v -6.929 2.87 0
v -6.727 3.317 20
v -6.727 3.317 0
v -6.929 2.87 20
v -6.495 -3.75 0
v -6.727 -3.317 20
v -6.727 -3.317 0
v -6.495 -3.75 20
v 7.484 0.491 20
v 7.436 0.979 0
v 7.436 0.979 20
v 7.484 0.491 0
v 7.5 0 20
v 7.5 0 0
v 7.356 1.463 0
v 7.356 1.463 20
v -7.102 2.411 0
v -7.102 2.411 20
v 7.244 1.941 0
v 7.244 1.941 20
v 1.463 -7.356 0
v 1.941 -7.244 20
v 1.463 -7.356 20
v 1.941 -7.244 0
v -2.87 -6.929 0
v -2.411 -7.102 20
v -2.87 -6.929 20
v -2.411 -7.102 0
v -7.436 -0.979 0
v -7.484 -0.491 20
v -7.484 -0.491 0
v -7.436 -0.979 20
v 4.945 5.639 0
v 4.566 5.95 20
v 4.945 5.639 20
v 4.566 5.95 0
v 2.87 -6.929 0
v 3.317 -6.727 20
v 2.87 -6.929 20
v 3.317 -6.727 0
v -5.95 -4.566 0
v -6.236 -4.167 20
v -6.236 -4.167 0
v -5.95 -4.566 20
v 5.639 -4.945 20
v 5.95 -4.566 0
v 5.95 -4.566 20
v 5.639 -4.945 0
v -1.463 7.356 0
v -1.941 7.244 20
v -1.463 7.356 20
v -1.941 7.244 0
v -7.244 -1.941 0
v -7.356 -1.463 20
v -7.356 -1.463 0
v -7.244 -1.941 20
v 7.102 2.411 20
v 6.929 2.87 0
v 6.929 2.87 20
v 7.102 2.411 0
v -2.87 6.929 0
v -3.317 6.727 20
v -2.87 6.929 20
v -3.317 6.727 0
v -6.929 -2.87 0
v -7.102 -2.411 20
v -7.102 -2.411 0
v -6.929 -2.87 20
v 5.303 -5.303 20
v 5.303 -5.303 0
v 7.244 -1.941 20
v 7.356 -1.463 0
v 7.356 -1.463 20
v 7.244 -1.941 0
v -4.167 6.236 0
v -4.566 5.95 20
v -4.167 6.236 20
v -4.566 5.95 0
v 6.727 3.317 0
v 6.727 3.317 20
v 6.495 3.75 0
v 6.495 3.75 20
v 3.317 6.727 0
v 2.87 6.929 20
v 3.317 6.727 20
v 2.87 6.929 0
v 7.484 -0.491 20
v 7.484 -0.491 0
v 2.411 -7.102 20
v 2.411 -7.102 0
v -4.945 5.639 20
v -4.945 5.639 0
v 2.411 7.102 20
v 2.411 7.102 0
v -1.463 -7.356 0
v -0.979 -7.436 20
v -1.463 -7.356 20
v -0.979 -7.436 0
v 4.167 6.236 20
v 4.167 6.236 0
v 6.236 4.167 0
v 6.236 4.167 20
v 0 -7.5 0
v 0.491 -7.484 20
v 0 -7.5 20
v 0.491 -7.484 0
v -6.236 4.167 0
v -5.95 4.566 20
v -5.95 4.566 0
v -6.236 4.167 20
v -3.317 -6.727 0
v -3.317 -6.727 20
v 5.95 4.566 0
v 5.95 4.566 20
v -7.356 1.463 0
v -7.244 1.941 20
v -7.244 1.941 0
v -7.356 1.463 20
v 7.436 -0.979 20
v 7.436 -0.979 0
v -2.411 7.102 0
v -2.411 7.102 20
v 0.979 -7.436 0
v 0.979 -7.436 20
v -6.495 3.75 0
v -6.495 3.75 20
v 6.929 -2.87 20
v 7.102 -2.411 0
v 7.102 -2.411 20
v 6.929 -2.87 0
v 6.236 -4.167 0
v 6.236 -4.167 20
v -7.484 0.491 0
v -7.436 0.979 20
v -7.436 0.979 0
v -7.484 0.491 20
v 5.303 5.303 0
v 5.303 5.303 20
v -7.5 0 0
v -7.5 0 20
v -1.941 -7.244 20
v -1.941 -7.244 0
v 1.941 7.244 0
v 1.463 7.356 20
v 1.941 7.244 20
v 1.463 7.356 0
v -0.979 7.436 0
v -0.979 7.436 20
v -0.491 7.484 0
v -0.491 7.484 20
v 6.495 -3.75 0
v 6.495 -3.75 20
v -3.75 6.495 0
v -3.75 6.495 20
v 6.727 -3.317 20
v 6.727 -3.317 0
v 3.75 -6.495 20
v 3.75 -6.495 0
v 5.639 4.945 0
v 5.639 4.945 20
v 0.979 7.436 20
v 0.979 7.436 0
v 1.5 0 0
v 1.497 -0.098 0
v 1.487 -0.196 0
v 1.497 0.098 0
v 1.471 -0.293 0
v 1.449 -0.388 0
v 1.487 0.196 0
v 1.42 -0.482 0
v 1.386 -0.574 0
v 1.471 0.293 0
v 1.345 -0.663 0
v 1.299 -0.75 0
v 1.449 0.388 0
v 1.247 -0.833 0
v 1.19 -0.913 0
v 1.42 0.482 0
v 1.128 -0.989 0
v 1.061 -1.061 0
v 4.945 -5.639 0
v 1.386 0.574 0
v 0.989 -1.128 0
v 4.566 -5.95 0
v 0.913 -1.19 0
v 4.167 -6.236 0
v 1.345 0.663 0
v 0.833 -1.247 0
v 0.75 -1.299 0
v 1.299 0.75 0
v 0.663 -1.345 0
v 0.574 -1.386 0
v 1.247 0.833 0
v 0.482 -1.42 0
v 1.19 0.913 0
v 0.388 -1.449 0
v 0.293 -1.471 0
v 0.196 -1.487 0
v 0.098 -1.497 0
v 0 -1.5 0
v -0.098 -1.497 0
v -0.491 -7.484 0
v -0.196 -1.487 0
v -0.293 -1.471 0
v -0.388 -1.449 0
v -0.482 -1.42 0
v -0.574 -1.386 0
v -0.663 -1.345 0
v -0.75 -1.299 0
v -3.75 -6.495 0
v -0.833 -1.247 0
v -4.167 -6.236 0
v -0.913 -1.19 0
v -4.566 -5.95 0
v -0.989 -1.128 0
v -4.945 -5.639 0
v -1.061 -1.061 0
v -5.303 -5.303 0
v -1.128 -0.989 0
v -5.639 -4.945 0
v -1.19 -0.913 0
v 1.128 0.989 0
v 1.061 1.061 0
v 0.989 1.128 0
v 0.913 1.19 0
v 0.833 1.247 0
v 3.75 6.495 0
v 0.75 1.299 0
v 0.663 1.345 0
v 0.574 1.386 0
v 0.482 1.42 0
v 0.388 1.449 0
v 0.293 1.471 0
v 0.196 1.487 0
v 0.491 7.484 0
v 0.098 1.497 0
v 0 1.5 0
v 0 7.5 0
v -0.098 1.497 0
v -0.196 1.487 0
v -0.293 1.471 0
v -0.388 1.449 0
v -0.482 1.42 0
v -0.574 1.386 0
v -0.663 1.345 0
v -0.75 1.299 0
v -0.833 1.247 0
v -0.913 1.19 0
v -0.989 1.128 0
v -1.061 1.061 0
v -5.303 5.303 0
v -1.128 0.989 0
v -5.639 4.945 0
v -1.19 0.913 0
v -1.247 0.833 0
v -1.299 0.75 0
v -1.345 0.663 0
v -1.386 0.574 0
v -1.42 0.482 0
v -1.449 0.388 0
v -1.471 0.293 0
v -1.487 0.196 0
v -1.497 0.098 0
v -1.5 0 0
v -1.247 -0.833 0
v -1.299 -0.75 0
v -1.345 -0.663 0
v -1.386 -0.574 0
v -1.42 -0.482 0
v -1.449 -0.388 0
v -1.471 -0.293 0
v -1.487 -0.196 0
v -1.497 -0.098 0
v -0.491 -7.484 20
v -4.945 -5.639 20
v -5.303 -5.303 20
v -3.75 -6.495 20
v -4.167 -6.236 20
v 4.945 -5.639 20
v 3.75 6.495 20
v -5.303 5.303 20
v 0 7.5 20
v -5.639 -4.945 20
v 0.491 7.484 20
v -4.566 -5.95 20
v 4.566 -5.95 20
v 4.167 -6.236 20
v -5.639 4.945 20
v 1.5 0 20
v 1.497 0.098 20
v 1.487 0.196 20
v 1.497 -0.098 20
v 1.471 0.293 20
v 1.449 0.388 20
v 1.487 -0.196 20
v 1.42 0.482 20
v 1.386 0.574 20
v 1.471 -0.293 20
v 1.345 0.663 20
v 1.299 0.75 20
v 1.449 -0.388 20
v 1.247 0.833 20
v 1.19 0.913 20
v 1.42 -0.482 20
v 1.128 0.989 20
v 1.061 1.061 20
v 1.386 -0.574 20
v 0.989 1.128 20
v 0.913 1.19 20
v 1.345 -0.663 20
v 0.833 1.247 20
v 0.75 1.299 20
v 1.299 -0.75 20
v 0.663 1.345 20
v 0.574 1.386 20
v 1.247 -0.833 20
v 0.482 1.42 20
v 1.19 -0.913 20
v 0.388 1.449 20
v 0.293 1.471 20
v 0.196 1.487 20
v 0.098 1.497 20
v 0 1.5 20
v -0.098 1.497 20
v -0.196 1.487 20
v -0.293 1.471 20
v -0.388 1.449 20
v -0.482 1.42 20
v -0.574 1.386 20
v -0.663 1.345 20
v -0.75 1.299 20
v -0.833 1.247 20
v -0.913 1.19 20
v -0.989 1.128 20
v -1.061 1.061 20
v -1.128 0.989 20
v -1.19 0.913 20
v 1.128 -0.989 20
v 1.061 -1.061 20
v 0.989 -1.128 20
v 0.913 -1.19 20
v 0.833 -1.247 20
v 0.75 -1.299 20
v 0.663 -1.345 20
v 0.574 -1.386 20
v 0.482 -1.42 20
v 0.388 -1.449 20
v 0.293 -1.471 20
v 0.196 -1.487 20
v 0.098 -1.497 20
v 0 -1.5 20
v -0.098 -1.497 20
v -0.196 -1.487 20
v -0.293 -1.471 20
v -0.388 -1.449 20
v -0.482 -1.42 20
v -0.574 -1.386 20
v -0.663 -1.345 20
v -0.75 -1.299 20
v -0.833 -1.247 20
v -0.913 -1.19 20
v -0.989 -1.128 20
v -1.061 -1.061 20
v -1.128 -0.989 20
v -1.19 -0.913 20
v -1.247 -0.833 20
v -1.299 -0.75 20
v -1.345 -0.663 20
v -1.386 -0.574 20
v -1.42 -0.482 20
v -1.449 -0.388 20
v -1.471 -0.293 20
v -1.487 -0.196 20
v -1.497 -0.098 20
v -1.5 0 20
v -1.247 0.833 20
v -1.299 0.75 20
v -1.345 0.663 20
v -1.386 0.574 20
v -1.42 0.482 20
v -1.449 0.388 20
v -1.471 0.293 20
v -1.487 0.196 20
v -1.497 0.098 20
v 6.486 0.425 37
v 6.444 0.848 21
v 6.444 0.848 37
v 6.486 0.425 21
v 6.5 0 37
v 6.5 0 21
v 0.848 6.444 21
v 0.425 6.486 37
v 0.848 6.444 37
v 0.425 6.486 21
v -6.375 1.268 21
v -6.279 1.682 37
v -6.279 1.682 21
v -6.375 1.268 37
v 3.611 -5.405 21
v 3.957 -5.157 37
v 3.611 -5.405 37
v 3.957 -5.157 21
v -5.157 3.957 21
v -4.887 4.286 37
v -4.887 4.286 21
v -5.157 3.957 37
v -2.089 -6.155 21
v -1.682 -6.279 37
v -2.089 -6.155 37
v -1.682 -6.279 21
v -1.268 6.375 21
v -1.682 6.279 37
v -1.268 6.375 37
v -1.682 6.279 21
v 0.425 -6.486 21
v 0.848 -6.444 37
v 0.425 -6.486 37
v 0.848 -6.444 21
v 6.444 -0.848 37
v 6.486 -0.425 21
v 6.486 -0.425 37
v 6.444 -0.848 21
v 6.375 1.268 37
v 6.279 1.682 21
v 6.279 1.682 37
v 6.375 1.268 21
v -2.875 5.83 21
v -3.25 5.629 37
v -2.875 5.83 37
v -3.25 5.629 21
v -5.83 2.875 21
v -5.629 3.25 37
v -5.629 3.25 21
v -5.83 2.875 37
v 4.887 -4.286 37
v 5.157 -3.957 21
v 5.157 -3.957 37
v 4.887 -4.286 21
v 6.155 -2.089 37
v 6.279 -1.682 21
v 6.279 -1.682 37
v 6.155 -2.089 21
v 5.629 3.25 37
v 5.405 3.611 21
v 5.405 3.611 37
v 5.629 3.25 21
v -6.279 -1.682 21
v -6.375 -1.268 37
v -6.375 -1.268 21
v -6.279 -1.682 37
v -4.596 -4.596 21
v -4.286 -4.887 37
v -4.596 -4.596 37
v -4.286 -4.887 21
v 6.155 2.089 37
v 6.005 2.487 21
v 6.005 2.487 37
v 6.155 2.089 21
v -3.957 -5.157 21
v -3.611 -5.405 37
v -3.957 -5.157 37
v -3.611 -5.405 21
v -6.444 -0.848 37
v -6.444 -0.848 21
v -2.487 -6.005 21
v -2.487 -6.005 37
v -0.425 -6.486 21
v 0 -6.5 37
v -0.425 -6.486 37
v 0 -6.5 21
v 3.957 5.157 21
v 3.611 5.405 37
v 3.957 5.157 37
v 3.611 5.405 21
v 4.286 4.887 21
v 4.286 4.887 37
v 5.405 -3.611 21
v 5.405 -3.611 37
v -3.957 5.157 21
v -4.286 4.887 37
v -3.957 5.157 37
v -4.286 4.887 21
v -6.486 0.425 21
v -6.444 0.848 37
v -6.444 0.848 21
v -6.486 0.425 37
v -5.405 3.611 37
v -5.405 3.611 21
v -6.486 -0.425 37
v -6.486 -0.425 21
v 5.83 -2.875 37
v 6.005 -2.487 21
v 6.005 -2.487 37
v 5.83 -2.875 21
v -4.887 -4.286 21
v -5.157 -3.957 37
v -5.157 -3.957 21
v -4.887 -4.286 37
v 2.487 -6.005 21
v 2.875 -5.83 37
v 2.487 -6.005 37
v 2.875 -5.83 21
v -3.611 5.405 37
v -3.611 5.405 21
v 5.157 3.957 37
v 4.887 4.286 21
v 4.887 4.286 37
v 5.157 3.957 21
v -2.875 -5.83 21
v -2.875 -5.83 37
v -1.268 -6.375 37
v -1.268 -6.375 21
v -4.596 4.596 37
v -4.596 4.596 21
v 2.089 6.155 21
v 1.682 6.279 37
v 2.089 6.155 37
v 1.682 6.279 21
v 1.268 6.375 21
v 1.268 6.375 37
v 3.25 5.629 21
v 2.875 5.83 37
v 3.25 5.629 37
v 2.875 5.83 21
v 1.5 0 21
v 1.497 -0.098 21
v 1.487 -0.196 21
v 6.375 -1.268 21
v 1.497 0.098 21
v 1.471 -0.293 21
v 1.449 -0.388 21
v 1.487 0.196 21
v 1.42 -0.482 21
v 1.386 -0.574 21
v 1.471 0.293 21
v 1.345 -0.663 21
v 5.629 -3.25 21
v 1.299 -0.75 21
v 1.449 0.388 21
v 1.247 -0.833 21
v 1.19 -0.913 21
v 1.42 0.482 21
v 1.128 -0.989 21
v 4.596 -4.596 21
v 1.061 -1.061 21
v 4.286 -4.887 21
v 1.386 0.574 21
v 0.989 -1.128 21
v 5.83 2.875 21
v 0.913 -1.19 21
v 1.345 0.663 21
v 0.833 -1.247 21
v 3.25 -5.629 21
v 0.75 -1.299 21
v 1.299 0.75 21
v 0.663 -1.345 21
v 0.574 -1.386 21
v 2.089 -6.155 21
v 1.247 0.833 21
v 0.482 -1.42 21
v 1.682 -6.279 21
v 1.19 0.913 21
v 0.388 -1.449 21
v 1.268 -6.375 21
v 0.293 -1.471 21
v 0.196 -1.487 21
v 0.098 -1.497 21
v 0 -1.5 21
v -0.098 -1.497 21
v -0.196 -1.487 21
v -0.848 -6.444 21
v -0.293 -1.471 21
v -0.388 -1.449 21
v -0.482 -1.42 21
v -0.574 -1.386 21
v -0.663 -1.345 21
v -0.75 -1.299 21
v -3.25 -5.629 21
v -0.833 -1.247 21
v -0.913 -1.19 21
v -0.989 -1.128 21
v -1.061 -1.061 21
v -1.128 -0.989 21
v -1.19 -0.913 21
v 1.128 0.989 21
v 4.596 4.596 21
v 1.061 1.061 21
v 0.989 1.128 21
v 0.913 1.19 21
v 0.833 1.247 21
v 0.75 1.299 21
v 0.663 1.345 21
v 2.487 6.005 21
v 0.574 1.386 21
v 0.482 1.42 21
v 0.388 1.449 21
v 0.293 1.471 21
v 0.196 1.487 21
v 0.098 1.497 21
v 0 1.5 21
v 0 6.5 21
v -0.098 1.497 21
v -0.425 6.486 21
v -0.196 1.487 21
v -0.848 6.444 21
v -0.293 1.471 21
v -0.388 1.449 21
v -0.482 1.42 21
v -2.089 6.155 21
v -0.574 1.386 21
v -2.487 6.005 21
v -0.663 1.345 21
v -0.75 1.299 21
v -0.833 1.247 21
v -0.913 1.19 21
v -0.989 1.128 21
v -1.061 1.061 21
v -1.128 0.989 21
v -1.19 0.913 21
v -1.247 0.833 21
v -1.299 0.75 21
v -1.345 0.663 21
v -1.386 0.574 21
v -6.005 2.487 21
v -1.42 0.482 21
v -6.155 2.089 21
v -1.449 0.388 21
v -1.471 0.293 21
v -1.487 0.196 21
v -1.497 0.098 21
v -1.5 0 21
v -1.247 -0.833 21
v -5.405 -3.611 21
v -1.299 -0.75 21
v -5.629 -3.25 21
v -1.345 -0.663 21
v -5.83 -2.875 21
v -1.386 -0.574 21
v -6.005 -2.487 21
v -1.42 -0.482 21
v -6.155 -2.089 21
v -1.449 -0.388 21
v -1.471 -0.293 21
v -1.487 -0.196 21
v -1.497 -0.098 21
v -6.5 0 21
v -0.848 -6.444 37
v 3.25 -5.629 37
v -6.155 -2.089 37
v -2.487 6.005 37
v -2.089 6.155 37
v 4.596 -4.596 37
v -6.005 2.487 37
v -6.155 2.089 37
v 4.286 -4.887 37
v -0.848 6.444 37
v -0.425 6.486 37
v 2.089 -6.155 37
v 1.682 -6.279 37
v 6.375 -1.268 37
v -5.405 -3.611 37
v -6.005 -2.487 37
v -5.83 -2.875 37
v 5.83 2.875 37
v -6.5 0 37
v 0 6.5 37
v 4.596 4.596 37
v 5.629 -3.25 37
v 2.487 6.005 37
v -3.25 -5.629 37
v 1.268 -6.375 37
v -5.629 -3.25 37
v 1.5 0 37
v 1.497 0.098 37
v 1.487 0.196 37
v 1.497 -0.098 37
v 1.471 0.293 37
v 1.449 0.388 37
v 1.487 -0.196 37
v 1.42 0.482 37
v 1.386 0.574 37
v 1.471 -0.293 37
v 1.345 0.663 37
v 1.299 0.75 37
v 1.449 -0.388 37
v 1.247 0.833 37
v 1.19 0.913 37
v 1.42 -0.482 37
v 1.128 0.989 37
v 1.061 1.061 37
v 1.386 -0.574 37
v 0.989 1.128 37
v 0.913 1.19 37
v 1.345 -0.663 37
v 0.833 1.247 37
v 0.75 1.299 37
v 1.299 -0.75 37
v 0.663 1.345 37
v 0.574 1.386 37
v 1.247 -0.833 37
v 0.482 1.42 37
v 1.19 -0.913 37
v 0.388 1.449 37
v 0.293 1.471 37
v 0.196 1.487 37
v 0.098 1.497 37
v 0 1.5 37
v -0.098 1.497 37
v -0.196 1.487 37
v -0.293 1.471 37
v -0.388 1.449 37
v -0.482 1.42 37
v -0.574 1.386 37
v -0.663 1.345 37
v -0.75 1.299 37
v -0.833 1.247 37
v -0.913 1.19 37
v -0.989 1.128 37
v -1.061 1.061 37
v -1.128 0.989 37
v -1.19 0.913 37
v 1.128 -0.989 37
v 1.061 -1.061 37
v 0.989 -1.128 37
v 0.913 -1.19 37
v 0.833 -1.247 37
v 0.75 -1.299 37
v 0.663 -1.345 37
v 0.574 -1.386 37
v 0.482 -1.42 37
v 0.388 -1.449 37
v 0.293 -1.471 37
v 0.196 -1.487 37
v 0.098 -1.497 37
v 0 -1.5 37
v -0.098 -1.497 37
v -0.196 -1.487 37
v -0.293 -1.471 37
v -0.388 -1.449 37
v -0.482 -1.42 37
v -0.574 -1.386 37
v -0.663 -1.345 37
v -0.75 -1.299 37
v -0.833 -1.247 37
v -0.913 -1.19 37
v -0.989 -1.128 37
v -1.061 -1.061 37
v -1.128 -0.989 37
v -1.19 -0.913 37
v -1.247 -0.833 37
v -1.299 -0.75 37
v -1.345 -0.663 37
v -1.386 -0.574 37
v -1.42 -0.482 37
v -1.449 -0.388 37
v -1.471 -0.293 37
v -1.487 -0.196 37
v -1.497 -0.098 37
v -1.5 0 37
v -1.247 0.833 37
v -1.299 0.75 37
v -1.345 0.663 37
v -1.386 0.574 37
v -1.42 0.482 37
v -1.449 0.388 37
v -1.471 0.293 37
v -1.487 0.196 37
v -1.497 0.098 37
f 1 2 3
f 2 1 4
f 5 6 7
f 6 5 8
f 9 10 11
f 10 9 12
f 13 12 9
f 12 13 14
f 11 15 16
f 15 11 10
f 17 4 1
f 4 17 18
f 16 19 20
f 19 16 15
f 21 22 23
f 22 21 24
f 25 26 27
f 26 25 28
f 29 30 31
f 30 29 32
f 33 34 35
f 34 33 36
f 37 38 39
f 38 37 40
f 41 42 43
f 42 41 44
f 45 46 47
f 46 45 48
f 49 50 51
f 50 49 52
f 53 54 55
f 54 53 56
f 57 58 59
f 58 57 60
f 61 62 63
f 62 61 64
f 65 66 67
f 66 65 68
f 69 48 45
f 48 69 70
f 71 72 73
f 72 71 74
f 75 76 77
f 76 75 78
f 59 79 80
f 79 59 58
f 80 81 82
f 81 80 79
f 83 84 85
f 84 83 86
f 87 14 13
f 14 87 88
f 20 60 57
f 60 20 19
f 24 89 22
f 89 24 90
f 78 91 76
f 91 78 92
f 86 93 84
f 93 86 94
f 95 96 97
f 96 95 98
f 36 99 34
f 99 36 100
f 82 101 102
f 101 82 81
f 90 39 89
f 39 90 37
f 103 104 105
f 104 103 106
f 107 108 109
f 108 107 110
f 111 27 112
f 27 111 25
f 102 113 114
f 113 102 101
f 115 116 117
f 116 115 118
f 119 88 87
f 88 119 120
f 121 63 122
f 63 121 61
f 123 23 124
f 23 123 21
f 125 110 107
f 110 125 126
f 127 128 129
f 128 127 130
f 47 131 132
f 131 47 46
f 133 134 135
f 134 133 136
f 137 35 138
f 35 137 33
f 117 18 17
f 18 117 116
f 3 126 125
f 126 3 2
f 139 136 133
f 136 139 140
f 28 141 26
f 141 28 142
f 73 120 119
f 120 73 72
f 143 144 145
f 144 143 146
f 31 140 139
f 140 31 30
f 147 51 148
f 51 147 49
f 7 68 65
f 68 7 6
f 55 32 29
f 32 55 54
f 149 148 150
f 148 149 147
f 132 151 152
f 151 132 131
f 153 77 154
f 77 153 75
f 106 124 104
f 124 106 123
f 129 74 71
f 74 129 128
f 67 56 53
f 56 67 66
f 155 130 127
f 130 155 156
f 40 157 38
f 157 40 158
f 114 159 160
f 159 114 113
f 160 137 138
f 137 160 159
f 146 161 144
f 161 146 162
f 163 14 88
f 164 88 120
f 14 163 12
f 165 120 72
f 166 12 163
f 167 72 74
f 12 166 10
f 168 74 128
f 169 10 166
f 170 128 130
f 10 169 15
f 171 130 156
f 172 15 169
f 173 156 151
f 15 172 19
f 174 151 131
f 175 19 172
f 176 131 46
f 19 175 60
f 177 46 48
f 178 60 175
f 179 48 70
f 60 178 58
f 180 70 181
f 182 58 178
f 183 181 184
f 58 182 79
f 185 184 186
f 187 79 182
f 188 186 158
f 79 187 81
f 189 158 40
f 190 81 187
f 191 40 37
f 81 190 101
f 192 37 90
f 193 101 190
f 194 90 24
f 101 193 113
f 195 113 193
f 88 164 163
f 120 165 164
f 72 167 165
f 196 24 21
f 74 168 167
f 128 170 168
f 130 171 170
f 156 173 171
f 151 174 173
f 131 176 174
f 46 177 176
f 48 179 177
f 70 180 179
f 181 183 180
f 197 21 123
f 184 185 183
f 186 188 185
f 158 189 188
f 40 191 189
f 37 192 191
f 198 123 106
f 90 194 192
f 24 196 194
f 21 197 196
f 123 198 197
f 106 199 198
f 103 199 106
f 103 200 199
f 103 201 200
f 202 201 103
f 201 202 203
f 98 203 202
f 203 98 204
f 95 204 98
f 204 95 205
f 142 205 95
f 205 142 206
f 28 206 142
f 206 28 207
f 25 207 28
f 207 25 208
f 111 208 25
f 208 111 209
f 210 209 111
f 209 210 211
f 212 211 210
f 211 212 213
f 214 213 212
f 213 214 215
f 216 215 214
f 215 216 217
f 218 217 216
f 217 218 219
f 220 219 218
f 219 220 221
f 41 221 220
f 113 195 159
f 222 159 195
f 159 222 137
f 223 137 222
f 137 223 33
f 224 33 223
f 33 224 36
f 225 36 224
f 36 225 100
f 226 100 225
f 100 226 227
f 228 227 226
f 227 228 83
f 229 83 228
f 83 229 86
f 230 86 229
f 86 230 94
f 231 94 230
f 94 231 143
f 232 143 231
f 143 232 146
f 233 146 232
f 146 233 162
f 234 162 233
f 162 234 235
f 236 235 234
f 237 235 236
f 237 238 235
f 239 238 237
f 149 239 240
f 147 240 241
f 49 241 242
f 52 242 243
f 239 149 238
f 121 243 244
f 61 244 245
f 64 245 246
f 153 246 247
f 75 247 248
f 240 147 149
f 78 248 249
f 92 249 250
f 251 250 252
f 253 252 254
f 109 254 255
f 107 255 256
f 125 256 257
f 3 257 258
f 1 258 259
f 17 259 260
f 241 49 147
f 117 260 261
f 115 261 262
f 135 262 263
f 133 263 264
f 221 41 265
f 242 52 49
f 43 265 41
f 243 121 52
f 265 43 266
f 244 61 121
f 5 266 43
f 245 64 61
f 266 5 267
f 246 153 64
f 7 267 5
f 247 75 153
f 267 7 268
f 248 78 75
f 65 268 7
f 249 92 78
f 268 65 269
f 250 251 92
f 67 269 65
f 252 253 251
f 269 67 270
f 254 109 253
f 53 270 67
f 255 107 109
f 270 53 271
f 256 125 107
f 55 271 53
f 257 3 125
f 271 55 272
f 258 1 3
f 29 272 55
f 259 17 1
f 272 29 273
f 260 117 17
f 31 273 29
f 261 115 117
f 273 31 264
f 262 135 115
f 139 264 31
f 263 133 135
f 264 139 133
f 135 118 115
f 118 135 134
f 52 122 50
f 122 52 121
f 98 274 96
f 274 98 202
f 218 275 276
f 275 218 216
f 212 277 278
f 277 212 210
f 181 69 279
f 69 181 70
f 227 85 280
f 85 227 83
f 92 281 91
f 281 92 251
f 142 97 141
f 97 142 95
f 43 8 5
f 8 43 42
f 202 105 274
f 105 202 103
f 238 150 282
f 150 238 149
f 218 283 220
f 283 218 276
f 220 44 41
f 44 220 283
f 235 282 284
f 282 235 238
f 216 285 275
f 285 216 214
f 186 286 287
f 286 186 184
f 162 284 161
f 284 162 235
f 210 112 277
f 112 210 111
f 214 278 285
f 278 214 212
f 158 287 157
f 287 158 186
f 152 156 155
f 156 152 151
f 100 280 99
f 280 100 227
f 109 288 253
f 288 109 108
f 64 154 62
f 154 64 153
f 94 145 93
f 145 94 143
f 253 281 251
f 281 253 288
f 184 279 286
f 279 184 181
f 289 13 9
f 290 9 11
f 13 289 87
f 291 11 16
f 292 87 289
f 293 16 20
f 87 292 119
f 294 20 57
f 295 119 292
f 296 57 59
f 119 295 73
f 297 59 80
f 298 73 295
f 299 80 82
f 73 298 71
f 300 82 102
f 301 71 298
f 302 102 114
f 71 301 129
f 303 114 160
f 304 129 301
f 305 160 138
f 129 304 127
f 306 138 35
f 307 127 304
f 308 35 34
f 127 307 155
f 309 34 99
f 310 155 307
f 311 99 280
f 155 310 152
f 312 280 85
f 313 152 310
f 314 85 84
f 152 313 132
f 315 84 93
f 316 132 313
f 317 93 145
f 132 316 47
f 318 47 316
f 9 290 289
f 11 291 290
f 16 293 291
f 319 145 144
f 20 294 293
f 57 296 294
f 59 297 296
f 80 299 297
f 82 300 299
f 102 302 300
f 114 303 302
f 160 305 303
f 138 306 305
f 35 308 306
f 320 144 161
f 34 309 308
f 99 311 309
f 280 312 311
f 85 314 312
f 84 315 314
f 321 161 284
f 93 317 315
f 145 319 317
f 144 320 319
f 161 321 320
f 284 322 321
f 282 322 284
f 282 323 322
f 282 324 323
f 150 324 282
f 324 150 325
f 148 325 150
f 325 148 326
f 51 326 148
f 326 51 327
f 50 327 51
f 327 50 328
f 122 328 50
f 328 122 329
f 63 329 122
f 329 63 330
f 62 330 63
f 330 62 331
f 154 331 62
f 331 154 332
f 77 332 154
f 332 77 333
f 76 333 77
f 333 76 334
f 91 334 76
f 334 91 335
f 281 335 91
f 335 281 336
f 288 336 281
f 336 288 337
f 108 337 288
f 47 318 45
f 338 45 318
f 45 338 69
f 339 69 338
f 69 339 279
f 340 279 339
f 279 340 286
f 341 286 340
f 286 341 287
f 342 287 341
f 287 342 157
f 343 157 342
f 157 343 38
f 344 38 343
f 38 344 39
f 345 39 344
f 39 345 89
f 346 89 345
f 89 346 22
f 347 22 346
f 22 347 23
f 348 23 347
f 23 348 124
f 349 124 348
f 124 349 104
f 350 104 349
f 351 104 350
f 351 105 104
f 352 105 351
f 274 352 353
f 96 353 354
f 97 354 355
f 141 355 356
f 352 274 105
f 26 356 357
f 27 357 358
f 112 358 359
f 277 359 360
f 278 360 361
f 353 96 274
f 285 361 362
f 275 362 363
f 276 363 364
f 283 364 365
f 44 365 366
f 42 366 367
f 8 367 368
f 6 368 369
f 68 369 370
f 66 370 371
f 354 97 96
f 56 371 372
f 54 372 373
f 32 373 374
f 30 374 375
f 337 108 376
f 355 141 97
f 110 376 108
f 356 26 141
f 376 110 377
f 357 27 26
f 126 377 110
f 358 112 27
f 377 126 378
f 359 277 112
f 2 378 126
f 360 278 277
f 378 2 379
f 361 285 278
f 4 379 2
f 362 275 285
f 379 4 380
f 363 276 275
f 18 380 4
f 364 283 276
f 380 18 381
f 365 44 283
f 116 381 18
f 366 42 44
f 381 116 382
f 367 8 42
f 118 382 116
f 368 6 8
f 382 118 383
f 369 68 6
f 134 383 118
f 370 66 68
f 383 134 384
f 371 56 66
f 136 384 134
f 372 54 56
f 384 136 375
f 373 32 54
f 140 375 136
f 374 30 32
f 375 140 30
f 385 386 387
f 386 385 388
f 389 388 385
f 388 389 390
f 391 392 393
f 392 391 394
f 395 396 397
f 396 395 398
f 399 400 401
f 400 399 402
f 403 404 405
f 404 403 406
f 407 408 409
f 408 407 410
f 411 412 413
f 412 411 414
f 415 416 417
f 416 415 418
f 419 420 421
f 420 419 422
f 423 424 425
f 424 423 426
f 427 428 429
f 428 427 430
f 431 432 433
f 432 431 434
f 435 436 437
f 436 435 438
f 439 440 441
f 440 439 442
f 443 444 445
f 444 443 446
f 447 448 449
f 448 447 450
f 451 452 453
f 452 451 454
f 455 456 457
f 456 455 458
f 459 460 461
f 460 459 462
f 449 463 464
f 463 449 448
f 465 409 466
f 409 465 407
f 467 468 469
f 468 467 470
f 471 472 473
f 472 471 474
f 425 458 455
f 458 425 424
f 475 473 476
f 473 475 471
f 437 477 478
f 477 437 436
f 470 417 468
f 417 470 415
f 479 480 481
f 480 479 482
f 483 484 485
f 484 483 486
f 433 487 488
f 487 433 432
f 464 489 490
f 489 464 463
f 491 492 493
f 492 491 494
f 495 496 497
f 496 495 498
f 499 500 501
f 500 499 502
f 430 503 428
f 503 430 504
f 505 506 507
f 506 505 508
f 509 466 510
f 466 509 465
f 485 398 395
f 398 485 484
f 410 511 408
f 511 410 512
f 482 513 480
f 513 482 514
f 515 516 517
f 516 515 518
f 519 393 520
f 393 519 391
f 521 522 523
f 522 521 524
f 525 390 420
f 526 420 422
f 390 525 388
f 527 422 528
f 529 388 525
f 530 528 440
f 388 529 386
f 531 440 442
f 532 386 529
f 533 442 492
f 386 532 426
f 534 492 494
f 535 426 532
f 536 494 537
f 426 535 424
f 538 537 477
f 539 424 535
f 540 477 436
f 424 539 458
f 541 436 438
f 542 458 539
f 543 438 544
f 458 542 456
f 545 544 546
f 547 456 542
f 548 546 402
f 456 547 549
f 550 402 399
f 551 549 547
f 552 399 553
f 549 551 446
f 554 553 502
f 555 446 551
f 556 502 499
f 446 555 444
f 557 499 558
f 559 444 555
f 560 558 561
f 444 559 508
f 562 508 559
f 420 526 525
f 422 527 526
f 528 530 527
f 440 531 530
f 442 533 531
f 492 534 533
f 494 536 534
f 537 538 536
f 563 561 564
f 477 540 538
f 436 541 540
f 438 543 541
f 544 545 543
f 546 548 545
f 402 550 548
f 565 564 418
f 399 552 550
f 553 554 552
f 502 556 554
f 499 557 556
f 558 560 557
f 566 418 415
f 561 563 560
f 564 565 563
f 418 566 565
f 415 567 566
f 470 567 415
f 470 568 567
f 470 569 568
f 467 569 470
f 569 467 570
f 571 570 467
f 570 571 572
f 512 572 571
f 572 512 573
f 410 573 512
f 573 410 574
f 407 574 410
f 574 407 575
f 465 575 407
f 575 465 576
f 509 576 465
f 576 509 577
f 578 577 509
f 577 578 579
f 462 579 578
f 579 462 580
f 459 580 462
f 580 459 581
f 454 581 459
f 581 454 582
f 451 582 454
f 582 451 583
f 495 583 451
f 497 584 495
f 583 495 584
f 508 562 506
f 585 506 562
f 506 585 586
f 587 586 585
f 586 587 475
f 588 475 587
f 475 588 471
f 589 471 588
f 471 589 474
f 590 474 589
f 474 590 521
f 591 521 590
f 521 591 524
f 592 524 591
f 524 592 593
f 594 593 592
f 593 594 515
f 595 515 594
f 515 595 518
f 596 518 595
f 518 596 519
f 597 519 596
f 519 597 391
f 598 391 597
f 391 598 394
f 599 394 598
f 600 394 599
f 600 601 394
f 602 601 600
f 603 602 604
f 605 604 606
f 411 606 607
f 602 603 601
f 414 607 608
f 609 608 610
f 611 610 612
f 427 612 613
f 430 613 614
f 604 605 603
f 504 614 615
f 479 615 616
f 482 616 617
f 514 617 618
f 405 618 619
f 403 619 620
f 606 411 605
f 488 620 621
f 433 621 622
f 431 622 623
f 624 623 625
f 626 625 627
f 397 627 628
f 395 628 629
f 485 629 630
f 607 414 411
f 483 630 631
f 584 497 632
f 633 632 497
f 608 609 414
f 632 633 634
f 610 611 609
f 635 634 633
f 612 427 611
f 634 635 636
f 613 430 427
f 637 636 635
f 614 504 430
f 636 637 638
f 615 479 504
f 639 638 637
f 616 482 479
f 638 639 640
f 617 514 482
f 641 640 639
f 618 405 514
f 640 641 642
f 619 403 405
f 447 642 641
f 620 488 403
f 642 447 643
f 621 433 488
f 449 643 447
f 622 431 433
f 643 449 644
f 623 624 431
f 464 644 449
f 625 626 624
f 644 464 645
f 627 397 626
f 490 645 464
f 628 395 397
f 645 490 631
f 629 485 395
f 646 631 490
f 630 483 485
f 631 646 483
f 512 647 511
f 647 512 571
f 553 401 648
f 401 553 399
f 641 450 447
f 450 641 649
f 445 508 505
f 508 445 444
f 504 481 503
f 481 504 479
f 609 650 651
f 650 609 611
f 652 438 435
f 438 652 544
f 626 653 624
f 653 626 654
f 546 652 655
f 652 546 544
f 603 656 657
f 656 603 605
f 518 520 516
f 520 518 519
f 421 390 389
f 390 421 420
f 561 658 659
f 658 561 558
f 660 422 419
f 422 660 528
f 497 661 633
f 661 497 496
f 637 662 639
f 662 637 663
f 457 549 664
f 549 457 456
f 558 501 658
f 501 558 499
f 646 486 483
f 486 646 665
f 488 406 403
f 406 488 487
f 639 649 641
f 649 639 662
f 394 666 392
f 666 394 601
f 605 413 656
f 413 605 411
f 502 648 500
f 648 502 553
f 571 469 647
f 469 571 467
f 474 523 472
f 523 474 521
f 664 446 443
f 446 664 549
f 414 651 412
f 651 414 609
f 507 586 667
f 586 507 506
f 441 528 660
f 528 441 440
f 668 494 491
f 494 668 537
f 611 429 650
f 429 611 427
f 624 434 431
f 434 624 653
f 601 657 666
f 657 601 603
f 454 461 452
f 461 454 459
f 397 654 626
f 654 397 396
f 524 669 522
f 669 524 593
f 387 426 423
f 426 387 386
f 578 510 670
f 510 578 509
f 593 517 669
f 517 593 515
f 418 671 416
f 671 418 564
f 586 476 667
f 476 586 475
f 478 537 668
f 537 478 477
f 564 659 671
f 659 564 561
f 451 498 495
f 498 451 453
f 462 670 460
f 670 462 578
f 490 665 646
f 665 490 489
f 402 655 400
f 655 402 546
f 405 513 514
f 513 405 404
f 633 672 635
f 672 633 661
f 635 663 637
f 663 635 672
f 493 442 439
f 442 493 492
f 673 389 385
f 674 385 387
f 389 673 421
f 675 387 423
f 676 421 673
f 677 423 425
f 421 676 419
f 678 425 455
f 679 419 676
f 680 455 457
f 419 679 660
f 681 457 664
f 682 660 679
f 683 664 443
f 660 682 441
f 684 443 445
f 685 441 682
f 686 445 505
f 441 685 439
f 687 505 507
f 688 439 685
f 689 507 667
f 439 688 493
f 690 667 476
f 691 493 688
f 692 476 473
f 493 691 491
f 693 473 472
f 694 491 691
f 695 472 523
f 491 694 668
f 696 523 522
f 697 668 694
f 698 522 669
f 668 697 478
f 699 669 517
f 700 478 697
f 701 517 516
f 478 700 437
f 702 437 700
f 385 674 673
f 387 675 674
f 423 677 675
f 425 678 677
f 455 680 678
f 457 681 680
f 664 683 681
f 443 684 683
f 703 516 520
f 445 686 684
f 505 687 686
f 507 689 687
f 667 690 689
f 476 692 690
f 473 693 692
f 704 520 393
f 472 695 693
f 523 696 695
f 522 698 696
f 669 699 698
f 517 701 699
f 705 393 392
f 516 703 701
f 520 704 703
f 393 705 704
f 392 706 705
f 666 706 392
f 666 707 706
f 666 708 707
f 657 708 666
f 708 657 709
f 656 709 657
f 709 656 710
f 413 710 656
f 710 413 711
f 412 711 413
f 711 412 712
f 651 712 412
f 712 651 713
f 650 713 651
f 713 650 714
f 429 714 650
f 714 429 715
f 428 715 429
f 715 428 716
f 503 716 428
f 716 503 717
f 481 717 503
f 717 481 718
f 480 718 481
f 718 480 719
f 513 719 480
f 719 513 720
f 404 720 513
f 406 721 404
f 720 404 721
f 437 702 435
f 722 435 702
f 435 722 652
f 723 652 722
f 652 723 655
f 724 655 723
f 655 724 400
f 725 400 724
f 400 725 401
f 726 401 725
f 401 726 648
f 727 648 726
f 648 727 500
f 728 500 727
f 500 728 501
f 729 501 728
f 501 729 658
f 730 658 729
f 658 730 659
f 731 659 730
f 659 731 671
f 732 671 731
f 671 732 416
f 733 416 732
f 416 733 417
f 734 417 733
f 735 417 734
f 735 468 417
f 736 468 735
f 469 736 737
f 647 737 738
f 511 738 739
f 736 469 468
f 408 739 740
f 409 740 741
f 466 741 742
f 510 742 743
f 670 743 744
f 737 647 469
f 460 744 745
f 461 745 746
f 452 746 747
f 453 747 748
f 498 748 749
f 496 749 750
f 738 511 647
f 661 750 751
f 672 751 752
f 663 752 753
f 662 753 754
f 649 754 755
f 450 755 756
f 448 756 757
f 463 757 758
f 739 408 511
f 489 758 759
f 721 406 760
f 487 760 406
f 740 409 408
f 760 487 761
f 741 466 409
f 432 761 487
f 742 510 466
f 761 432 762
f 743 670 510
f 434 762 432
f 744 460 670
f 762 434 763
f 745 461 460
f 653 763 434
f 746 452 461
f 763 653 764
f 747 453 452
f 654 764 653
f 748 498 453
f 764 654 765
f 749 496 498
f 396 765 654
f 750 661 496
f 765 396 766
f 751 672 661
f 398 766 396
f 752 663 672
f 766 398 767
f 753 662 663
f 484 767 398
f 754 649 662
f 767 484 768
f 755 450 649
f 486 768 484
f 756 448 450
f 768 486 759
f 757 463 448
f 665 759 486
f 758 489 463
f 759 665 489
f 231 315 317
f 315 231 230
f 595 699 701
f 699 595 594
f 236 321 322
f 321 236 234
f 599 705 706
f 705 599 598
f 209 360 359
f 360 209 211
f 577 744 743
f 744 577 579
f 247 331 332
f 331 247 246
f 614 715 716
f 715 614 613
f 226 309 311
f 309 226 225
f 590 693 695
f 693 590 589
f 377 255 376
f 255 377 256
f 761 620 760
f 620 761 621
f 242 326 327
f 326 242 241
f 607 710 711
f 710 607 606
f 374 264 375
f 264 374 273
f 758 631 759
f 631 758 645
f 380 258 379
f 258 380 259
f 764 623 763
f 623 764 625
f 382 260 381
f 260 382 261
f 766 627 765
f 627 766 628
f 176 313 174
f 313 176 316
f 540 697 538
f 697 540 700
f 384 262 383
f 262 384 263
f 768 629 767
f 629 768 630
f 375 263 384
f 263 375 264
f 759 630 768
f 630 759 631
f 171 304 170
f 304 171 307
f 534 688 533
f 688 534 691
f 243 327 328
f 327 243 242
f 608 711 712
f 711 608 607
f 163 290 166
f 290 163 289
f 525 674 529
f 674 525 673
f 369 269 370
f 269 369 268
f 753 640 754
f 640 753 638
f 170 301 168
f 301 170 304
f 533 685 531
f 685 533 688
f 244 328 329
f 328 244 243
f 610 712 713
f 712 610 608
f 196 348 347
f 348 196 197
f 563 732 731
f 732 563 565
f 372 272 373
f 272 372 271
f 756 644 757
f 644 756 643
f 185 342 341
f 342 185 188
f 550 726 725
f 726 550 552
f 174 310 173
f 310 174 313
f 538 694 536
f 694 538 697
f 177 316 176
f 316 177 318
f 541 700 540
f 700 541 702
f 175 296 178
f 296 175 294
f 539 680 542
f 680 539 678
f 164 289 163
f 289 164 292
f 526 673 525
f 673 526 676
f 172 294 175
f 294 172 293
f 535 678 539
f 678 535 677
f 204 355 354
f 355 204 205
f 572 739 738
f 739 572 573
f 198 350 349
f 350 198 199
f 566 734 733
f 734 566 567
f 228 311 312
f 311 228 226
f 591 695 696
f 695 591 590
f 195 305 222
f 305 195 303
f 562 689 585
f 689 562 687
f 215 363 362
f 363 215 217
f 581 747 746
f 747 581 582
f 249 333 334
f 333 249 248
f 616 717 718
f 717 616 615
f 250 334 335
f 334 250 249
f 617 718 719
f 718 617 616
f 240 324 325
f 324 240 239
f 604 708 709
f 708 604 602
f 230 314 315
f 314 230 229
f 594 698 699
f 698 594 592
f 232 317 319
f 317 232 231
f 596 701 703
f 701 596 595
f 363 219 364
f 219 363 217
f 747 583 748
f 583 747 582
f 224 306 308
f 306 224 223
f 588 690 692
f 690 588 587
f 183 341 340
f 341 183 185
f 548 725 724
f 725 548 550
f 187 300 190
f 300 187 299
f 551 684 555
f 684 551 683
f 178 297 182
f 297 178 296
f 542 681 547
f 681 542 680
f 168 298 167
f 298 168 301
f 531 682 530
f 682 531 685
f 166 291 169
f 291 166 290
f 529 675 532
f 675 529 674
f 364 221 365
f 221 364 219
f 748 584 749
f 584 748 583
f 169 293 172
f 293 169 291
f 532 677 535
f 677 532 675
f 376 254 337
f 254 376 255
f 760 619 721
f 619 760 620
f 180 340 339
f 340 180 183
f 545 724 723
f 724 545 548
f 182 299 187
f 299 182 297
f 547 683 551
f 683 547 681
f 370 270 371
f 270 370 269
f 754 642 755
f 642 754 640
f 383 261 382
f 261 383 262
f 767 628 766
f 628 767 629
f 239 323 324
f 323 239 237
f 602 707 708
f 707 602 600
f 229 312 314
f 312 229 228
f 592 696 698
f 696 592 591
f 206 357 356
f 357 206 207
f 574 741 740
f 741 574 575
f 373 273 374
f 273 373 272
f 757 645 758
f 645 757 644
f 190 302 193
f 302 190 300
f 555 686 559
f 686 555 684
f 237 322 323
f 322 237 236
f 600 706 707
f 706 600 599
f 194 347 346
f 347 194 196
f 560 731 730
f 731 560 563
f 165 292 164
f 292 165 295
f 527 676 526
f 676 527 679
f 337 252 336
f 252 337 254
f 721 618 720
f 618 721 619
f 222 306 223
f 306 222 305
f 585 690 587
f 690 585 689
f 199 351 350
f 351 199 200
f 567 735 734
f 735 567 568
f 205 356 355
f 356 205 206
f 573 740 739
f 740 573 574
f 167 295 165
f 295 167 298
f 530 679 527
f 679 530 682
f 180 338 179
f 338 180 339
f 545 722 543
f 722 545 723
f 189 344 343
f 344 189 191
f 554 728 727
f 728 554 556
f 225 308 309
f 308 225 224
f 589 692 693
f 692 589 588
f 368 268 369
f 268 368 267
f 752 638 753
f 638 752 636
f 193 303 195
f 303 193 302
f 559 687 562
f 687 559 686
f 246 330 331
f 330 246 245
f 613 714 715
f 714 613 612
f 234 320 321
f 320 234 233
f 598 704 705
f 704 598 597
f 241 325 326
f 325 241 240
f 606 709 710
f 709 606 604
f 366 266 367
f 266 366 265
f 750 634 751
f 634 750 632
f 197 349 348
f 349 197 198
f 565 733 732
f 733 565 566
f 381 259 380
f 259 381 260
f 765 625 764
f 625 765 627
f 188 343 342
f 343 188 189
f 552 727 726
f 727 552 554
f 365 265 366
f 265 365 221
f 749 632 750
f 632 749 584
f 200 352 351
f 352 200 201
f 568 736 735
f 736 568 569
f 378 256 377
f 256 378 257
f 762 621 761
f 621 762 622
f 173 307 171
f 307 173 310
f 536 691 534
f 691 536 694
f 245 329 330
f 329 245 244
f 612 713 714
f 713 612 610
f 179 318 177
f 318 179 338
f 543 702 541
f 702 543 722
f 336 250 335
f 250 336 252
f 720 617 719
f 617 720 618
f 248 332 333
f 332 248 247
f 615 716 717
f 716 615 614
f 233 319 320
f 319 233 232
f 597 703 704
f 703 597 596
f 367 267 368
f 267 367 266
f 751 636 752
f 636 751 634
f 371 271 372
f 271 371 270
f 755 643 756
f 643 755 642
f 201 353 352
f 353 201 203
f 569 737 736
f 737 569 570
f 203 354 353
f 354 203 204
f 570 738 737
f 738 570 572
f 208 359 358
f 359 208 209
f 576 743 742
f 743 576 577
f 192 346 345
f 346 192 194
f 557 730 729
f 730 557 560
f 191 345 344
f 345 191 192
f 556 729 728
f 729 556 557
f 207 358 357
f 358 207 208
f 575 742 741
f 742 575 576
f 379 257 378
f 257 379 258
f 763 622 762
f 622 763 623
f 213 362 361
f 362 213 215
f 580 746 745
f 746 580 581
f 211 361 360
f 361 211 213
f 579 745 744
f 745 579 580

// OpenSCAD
// Hose-barb reducer: 8 mm tubing (z = 0..20) -> 5 mm tubing (z = 25..41)
// Print orientation: standing upright along +Z, centred on the origin in X/Y.
// Units: mm. Bore through full length: 3 mm.

// ---------------- Parameters ----------------
reducer_bore      = 3;     // through-bore diameter
barb_8_tube_od    = 7.5;   // 8 mm tubing barb outer diameter (bottom)
barb_8_tube_top_od = 9.5;  // 8 mm tubing barb outer diameter (top)
barb_8_tube_h     = 10;    // 8 mm tubing barb height
barb_8_count      = 2;     // number of 8 mm barbs (stacked)

barb_5_tube_od    = 6.5;   // 5 mm tubing barb outer diameter (bottom)
barb_5_tube_top_od = 5.0;  // 5 mm tubing barb outer diameter (top)
barb_5_tube_h     = 8;     // 5 mm tubing barb height
barb_5_count      = 2;     // number of 5 mm barbs (stacked)

collar_d          = 12;    // transition collar diameter
collar_h          = 5;     // transition collar height (z = 20..25)

eps               = 0.5;   // overshoot for clean boolean cuts

$fn = 96;

// ---------------- Model ----------------
difference() {
    union() {
        // 8 mm tubing barbs
        for (i = [0 : barb_8_count - 1]) {
            translate([0, 0, i * barb_8_tube_h])
                cylinder(h = barb_8_tube_h, r = barb_8_tube_od);
        }

        // 5 mm tubing barbs
        for (i = [0 : barb_5_count - 1]) {
            translate([0, 0, (barb_5_count * barb_5_tube_h + collar_h) + i * barb_5_tube_h])
                cylinder(h = barb_5_tube_h, r = barb_5_tube_od);
        }

        // Transition collar (z = 20..25)
        translate([0, 0, collar_h])
            cylinder(h = collar_h, r = collar_d / 2);
    }

    // Through bore
    translate([0, 0, -eps])
        cylinder(h = barb_8_count * barb_8_tube_h + collar_h + barb_5_count * barb_5_tube_h + 2 * eps,
                 d = reducer_bore);
}
